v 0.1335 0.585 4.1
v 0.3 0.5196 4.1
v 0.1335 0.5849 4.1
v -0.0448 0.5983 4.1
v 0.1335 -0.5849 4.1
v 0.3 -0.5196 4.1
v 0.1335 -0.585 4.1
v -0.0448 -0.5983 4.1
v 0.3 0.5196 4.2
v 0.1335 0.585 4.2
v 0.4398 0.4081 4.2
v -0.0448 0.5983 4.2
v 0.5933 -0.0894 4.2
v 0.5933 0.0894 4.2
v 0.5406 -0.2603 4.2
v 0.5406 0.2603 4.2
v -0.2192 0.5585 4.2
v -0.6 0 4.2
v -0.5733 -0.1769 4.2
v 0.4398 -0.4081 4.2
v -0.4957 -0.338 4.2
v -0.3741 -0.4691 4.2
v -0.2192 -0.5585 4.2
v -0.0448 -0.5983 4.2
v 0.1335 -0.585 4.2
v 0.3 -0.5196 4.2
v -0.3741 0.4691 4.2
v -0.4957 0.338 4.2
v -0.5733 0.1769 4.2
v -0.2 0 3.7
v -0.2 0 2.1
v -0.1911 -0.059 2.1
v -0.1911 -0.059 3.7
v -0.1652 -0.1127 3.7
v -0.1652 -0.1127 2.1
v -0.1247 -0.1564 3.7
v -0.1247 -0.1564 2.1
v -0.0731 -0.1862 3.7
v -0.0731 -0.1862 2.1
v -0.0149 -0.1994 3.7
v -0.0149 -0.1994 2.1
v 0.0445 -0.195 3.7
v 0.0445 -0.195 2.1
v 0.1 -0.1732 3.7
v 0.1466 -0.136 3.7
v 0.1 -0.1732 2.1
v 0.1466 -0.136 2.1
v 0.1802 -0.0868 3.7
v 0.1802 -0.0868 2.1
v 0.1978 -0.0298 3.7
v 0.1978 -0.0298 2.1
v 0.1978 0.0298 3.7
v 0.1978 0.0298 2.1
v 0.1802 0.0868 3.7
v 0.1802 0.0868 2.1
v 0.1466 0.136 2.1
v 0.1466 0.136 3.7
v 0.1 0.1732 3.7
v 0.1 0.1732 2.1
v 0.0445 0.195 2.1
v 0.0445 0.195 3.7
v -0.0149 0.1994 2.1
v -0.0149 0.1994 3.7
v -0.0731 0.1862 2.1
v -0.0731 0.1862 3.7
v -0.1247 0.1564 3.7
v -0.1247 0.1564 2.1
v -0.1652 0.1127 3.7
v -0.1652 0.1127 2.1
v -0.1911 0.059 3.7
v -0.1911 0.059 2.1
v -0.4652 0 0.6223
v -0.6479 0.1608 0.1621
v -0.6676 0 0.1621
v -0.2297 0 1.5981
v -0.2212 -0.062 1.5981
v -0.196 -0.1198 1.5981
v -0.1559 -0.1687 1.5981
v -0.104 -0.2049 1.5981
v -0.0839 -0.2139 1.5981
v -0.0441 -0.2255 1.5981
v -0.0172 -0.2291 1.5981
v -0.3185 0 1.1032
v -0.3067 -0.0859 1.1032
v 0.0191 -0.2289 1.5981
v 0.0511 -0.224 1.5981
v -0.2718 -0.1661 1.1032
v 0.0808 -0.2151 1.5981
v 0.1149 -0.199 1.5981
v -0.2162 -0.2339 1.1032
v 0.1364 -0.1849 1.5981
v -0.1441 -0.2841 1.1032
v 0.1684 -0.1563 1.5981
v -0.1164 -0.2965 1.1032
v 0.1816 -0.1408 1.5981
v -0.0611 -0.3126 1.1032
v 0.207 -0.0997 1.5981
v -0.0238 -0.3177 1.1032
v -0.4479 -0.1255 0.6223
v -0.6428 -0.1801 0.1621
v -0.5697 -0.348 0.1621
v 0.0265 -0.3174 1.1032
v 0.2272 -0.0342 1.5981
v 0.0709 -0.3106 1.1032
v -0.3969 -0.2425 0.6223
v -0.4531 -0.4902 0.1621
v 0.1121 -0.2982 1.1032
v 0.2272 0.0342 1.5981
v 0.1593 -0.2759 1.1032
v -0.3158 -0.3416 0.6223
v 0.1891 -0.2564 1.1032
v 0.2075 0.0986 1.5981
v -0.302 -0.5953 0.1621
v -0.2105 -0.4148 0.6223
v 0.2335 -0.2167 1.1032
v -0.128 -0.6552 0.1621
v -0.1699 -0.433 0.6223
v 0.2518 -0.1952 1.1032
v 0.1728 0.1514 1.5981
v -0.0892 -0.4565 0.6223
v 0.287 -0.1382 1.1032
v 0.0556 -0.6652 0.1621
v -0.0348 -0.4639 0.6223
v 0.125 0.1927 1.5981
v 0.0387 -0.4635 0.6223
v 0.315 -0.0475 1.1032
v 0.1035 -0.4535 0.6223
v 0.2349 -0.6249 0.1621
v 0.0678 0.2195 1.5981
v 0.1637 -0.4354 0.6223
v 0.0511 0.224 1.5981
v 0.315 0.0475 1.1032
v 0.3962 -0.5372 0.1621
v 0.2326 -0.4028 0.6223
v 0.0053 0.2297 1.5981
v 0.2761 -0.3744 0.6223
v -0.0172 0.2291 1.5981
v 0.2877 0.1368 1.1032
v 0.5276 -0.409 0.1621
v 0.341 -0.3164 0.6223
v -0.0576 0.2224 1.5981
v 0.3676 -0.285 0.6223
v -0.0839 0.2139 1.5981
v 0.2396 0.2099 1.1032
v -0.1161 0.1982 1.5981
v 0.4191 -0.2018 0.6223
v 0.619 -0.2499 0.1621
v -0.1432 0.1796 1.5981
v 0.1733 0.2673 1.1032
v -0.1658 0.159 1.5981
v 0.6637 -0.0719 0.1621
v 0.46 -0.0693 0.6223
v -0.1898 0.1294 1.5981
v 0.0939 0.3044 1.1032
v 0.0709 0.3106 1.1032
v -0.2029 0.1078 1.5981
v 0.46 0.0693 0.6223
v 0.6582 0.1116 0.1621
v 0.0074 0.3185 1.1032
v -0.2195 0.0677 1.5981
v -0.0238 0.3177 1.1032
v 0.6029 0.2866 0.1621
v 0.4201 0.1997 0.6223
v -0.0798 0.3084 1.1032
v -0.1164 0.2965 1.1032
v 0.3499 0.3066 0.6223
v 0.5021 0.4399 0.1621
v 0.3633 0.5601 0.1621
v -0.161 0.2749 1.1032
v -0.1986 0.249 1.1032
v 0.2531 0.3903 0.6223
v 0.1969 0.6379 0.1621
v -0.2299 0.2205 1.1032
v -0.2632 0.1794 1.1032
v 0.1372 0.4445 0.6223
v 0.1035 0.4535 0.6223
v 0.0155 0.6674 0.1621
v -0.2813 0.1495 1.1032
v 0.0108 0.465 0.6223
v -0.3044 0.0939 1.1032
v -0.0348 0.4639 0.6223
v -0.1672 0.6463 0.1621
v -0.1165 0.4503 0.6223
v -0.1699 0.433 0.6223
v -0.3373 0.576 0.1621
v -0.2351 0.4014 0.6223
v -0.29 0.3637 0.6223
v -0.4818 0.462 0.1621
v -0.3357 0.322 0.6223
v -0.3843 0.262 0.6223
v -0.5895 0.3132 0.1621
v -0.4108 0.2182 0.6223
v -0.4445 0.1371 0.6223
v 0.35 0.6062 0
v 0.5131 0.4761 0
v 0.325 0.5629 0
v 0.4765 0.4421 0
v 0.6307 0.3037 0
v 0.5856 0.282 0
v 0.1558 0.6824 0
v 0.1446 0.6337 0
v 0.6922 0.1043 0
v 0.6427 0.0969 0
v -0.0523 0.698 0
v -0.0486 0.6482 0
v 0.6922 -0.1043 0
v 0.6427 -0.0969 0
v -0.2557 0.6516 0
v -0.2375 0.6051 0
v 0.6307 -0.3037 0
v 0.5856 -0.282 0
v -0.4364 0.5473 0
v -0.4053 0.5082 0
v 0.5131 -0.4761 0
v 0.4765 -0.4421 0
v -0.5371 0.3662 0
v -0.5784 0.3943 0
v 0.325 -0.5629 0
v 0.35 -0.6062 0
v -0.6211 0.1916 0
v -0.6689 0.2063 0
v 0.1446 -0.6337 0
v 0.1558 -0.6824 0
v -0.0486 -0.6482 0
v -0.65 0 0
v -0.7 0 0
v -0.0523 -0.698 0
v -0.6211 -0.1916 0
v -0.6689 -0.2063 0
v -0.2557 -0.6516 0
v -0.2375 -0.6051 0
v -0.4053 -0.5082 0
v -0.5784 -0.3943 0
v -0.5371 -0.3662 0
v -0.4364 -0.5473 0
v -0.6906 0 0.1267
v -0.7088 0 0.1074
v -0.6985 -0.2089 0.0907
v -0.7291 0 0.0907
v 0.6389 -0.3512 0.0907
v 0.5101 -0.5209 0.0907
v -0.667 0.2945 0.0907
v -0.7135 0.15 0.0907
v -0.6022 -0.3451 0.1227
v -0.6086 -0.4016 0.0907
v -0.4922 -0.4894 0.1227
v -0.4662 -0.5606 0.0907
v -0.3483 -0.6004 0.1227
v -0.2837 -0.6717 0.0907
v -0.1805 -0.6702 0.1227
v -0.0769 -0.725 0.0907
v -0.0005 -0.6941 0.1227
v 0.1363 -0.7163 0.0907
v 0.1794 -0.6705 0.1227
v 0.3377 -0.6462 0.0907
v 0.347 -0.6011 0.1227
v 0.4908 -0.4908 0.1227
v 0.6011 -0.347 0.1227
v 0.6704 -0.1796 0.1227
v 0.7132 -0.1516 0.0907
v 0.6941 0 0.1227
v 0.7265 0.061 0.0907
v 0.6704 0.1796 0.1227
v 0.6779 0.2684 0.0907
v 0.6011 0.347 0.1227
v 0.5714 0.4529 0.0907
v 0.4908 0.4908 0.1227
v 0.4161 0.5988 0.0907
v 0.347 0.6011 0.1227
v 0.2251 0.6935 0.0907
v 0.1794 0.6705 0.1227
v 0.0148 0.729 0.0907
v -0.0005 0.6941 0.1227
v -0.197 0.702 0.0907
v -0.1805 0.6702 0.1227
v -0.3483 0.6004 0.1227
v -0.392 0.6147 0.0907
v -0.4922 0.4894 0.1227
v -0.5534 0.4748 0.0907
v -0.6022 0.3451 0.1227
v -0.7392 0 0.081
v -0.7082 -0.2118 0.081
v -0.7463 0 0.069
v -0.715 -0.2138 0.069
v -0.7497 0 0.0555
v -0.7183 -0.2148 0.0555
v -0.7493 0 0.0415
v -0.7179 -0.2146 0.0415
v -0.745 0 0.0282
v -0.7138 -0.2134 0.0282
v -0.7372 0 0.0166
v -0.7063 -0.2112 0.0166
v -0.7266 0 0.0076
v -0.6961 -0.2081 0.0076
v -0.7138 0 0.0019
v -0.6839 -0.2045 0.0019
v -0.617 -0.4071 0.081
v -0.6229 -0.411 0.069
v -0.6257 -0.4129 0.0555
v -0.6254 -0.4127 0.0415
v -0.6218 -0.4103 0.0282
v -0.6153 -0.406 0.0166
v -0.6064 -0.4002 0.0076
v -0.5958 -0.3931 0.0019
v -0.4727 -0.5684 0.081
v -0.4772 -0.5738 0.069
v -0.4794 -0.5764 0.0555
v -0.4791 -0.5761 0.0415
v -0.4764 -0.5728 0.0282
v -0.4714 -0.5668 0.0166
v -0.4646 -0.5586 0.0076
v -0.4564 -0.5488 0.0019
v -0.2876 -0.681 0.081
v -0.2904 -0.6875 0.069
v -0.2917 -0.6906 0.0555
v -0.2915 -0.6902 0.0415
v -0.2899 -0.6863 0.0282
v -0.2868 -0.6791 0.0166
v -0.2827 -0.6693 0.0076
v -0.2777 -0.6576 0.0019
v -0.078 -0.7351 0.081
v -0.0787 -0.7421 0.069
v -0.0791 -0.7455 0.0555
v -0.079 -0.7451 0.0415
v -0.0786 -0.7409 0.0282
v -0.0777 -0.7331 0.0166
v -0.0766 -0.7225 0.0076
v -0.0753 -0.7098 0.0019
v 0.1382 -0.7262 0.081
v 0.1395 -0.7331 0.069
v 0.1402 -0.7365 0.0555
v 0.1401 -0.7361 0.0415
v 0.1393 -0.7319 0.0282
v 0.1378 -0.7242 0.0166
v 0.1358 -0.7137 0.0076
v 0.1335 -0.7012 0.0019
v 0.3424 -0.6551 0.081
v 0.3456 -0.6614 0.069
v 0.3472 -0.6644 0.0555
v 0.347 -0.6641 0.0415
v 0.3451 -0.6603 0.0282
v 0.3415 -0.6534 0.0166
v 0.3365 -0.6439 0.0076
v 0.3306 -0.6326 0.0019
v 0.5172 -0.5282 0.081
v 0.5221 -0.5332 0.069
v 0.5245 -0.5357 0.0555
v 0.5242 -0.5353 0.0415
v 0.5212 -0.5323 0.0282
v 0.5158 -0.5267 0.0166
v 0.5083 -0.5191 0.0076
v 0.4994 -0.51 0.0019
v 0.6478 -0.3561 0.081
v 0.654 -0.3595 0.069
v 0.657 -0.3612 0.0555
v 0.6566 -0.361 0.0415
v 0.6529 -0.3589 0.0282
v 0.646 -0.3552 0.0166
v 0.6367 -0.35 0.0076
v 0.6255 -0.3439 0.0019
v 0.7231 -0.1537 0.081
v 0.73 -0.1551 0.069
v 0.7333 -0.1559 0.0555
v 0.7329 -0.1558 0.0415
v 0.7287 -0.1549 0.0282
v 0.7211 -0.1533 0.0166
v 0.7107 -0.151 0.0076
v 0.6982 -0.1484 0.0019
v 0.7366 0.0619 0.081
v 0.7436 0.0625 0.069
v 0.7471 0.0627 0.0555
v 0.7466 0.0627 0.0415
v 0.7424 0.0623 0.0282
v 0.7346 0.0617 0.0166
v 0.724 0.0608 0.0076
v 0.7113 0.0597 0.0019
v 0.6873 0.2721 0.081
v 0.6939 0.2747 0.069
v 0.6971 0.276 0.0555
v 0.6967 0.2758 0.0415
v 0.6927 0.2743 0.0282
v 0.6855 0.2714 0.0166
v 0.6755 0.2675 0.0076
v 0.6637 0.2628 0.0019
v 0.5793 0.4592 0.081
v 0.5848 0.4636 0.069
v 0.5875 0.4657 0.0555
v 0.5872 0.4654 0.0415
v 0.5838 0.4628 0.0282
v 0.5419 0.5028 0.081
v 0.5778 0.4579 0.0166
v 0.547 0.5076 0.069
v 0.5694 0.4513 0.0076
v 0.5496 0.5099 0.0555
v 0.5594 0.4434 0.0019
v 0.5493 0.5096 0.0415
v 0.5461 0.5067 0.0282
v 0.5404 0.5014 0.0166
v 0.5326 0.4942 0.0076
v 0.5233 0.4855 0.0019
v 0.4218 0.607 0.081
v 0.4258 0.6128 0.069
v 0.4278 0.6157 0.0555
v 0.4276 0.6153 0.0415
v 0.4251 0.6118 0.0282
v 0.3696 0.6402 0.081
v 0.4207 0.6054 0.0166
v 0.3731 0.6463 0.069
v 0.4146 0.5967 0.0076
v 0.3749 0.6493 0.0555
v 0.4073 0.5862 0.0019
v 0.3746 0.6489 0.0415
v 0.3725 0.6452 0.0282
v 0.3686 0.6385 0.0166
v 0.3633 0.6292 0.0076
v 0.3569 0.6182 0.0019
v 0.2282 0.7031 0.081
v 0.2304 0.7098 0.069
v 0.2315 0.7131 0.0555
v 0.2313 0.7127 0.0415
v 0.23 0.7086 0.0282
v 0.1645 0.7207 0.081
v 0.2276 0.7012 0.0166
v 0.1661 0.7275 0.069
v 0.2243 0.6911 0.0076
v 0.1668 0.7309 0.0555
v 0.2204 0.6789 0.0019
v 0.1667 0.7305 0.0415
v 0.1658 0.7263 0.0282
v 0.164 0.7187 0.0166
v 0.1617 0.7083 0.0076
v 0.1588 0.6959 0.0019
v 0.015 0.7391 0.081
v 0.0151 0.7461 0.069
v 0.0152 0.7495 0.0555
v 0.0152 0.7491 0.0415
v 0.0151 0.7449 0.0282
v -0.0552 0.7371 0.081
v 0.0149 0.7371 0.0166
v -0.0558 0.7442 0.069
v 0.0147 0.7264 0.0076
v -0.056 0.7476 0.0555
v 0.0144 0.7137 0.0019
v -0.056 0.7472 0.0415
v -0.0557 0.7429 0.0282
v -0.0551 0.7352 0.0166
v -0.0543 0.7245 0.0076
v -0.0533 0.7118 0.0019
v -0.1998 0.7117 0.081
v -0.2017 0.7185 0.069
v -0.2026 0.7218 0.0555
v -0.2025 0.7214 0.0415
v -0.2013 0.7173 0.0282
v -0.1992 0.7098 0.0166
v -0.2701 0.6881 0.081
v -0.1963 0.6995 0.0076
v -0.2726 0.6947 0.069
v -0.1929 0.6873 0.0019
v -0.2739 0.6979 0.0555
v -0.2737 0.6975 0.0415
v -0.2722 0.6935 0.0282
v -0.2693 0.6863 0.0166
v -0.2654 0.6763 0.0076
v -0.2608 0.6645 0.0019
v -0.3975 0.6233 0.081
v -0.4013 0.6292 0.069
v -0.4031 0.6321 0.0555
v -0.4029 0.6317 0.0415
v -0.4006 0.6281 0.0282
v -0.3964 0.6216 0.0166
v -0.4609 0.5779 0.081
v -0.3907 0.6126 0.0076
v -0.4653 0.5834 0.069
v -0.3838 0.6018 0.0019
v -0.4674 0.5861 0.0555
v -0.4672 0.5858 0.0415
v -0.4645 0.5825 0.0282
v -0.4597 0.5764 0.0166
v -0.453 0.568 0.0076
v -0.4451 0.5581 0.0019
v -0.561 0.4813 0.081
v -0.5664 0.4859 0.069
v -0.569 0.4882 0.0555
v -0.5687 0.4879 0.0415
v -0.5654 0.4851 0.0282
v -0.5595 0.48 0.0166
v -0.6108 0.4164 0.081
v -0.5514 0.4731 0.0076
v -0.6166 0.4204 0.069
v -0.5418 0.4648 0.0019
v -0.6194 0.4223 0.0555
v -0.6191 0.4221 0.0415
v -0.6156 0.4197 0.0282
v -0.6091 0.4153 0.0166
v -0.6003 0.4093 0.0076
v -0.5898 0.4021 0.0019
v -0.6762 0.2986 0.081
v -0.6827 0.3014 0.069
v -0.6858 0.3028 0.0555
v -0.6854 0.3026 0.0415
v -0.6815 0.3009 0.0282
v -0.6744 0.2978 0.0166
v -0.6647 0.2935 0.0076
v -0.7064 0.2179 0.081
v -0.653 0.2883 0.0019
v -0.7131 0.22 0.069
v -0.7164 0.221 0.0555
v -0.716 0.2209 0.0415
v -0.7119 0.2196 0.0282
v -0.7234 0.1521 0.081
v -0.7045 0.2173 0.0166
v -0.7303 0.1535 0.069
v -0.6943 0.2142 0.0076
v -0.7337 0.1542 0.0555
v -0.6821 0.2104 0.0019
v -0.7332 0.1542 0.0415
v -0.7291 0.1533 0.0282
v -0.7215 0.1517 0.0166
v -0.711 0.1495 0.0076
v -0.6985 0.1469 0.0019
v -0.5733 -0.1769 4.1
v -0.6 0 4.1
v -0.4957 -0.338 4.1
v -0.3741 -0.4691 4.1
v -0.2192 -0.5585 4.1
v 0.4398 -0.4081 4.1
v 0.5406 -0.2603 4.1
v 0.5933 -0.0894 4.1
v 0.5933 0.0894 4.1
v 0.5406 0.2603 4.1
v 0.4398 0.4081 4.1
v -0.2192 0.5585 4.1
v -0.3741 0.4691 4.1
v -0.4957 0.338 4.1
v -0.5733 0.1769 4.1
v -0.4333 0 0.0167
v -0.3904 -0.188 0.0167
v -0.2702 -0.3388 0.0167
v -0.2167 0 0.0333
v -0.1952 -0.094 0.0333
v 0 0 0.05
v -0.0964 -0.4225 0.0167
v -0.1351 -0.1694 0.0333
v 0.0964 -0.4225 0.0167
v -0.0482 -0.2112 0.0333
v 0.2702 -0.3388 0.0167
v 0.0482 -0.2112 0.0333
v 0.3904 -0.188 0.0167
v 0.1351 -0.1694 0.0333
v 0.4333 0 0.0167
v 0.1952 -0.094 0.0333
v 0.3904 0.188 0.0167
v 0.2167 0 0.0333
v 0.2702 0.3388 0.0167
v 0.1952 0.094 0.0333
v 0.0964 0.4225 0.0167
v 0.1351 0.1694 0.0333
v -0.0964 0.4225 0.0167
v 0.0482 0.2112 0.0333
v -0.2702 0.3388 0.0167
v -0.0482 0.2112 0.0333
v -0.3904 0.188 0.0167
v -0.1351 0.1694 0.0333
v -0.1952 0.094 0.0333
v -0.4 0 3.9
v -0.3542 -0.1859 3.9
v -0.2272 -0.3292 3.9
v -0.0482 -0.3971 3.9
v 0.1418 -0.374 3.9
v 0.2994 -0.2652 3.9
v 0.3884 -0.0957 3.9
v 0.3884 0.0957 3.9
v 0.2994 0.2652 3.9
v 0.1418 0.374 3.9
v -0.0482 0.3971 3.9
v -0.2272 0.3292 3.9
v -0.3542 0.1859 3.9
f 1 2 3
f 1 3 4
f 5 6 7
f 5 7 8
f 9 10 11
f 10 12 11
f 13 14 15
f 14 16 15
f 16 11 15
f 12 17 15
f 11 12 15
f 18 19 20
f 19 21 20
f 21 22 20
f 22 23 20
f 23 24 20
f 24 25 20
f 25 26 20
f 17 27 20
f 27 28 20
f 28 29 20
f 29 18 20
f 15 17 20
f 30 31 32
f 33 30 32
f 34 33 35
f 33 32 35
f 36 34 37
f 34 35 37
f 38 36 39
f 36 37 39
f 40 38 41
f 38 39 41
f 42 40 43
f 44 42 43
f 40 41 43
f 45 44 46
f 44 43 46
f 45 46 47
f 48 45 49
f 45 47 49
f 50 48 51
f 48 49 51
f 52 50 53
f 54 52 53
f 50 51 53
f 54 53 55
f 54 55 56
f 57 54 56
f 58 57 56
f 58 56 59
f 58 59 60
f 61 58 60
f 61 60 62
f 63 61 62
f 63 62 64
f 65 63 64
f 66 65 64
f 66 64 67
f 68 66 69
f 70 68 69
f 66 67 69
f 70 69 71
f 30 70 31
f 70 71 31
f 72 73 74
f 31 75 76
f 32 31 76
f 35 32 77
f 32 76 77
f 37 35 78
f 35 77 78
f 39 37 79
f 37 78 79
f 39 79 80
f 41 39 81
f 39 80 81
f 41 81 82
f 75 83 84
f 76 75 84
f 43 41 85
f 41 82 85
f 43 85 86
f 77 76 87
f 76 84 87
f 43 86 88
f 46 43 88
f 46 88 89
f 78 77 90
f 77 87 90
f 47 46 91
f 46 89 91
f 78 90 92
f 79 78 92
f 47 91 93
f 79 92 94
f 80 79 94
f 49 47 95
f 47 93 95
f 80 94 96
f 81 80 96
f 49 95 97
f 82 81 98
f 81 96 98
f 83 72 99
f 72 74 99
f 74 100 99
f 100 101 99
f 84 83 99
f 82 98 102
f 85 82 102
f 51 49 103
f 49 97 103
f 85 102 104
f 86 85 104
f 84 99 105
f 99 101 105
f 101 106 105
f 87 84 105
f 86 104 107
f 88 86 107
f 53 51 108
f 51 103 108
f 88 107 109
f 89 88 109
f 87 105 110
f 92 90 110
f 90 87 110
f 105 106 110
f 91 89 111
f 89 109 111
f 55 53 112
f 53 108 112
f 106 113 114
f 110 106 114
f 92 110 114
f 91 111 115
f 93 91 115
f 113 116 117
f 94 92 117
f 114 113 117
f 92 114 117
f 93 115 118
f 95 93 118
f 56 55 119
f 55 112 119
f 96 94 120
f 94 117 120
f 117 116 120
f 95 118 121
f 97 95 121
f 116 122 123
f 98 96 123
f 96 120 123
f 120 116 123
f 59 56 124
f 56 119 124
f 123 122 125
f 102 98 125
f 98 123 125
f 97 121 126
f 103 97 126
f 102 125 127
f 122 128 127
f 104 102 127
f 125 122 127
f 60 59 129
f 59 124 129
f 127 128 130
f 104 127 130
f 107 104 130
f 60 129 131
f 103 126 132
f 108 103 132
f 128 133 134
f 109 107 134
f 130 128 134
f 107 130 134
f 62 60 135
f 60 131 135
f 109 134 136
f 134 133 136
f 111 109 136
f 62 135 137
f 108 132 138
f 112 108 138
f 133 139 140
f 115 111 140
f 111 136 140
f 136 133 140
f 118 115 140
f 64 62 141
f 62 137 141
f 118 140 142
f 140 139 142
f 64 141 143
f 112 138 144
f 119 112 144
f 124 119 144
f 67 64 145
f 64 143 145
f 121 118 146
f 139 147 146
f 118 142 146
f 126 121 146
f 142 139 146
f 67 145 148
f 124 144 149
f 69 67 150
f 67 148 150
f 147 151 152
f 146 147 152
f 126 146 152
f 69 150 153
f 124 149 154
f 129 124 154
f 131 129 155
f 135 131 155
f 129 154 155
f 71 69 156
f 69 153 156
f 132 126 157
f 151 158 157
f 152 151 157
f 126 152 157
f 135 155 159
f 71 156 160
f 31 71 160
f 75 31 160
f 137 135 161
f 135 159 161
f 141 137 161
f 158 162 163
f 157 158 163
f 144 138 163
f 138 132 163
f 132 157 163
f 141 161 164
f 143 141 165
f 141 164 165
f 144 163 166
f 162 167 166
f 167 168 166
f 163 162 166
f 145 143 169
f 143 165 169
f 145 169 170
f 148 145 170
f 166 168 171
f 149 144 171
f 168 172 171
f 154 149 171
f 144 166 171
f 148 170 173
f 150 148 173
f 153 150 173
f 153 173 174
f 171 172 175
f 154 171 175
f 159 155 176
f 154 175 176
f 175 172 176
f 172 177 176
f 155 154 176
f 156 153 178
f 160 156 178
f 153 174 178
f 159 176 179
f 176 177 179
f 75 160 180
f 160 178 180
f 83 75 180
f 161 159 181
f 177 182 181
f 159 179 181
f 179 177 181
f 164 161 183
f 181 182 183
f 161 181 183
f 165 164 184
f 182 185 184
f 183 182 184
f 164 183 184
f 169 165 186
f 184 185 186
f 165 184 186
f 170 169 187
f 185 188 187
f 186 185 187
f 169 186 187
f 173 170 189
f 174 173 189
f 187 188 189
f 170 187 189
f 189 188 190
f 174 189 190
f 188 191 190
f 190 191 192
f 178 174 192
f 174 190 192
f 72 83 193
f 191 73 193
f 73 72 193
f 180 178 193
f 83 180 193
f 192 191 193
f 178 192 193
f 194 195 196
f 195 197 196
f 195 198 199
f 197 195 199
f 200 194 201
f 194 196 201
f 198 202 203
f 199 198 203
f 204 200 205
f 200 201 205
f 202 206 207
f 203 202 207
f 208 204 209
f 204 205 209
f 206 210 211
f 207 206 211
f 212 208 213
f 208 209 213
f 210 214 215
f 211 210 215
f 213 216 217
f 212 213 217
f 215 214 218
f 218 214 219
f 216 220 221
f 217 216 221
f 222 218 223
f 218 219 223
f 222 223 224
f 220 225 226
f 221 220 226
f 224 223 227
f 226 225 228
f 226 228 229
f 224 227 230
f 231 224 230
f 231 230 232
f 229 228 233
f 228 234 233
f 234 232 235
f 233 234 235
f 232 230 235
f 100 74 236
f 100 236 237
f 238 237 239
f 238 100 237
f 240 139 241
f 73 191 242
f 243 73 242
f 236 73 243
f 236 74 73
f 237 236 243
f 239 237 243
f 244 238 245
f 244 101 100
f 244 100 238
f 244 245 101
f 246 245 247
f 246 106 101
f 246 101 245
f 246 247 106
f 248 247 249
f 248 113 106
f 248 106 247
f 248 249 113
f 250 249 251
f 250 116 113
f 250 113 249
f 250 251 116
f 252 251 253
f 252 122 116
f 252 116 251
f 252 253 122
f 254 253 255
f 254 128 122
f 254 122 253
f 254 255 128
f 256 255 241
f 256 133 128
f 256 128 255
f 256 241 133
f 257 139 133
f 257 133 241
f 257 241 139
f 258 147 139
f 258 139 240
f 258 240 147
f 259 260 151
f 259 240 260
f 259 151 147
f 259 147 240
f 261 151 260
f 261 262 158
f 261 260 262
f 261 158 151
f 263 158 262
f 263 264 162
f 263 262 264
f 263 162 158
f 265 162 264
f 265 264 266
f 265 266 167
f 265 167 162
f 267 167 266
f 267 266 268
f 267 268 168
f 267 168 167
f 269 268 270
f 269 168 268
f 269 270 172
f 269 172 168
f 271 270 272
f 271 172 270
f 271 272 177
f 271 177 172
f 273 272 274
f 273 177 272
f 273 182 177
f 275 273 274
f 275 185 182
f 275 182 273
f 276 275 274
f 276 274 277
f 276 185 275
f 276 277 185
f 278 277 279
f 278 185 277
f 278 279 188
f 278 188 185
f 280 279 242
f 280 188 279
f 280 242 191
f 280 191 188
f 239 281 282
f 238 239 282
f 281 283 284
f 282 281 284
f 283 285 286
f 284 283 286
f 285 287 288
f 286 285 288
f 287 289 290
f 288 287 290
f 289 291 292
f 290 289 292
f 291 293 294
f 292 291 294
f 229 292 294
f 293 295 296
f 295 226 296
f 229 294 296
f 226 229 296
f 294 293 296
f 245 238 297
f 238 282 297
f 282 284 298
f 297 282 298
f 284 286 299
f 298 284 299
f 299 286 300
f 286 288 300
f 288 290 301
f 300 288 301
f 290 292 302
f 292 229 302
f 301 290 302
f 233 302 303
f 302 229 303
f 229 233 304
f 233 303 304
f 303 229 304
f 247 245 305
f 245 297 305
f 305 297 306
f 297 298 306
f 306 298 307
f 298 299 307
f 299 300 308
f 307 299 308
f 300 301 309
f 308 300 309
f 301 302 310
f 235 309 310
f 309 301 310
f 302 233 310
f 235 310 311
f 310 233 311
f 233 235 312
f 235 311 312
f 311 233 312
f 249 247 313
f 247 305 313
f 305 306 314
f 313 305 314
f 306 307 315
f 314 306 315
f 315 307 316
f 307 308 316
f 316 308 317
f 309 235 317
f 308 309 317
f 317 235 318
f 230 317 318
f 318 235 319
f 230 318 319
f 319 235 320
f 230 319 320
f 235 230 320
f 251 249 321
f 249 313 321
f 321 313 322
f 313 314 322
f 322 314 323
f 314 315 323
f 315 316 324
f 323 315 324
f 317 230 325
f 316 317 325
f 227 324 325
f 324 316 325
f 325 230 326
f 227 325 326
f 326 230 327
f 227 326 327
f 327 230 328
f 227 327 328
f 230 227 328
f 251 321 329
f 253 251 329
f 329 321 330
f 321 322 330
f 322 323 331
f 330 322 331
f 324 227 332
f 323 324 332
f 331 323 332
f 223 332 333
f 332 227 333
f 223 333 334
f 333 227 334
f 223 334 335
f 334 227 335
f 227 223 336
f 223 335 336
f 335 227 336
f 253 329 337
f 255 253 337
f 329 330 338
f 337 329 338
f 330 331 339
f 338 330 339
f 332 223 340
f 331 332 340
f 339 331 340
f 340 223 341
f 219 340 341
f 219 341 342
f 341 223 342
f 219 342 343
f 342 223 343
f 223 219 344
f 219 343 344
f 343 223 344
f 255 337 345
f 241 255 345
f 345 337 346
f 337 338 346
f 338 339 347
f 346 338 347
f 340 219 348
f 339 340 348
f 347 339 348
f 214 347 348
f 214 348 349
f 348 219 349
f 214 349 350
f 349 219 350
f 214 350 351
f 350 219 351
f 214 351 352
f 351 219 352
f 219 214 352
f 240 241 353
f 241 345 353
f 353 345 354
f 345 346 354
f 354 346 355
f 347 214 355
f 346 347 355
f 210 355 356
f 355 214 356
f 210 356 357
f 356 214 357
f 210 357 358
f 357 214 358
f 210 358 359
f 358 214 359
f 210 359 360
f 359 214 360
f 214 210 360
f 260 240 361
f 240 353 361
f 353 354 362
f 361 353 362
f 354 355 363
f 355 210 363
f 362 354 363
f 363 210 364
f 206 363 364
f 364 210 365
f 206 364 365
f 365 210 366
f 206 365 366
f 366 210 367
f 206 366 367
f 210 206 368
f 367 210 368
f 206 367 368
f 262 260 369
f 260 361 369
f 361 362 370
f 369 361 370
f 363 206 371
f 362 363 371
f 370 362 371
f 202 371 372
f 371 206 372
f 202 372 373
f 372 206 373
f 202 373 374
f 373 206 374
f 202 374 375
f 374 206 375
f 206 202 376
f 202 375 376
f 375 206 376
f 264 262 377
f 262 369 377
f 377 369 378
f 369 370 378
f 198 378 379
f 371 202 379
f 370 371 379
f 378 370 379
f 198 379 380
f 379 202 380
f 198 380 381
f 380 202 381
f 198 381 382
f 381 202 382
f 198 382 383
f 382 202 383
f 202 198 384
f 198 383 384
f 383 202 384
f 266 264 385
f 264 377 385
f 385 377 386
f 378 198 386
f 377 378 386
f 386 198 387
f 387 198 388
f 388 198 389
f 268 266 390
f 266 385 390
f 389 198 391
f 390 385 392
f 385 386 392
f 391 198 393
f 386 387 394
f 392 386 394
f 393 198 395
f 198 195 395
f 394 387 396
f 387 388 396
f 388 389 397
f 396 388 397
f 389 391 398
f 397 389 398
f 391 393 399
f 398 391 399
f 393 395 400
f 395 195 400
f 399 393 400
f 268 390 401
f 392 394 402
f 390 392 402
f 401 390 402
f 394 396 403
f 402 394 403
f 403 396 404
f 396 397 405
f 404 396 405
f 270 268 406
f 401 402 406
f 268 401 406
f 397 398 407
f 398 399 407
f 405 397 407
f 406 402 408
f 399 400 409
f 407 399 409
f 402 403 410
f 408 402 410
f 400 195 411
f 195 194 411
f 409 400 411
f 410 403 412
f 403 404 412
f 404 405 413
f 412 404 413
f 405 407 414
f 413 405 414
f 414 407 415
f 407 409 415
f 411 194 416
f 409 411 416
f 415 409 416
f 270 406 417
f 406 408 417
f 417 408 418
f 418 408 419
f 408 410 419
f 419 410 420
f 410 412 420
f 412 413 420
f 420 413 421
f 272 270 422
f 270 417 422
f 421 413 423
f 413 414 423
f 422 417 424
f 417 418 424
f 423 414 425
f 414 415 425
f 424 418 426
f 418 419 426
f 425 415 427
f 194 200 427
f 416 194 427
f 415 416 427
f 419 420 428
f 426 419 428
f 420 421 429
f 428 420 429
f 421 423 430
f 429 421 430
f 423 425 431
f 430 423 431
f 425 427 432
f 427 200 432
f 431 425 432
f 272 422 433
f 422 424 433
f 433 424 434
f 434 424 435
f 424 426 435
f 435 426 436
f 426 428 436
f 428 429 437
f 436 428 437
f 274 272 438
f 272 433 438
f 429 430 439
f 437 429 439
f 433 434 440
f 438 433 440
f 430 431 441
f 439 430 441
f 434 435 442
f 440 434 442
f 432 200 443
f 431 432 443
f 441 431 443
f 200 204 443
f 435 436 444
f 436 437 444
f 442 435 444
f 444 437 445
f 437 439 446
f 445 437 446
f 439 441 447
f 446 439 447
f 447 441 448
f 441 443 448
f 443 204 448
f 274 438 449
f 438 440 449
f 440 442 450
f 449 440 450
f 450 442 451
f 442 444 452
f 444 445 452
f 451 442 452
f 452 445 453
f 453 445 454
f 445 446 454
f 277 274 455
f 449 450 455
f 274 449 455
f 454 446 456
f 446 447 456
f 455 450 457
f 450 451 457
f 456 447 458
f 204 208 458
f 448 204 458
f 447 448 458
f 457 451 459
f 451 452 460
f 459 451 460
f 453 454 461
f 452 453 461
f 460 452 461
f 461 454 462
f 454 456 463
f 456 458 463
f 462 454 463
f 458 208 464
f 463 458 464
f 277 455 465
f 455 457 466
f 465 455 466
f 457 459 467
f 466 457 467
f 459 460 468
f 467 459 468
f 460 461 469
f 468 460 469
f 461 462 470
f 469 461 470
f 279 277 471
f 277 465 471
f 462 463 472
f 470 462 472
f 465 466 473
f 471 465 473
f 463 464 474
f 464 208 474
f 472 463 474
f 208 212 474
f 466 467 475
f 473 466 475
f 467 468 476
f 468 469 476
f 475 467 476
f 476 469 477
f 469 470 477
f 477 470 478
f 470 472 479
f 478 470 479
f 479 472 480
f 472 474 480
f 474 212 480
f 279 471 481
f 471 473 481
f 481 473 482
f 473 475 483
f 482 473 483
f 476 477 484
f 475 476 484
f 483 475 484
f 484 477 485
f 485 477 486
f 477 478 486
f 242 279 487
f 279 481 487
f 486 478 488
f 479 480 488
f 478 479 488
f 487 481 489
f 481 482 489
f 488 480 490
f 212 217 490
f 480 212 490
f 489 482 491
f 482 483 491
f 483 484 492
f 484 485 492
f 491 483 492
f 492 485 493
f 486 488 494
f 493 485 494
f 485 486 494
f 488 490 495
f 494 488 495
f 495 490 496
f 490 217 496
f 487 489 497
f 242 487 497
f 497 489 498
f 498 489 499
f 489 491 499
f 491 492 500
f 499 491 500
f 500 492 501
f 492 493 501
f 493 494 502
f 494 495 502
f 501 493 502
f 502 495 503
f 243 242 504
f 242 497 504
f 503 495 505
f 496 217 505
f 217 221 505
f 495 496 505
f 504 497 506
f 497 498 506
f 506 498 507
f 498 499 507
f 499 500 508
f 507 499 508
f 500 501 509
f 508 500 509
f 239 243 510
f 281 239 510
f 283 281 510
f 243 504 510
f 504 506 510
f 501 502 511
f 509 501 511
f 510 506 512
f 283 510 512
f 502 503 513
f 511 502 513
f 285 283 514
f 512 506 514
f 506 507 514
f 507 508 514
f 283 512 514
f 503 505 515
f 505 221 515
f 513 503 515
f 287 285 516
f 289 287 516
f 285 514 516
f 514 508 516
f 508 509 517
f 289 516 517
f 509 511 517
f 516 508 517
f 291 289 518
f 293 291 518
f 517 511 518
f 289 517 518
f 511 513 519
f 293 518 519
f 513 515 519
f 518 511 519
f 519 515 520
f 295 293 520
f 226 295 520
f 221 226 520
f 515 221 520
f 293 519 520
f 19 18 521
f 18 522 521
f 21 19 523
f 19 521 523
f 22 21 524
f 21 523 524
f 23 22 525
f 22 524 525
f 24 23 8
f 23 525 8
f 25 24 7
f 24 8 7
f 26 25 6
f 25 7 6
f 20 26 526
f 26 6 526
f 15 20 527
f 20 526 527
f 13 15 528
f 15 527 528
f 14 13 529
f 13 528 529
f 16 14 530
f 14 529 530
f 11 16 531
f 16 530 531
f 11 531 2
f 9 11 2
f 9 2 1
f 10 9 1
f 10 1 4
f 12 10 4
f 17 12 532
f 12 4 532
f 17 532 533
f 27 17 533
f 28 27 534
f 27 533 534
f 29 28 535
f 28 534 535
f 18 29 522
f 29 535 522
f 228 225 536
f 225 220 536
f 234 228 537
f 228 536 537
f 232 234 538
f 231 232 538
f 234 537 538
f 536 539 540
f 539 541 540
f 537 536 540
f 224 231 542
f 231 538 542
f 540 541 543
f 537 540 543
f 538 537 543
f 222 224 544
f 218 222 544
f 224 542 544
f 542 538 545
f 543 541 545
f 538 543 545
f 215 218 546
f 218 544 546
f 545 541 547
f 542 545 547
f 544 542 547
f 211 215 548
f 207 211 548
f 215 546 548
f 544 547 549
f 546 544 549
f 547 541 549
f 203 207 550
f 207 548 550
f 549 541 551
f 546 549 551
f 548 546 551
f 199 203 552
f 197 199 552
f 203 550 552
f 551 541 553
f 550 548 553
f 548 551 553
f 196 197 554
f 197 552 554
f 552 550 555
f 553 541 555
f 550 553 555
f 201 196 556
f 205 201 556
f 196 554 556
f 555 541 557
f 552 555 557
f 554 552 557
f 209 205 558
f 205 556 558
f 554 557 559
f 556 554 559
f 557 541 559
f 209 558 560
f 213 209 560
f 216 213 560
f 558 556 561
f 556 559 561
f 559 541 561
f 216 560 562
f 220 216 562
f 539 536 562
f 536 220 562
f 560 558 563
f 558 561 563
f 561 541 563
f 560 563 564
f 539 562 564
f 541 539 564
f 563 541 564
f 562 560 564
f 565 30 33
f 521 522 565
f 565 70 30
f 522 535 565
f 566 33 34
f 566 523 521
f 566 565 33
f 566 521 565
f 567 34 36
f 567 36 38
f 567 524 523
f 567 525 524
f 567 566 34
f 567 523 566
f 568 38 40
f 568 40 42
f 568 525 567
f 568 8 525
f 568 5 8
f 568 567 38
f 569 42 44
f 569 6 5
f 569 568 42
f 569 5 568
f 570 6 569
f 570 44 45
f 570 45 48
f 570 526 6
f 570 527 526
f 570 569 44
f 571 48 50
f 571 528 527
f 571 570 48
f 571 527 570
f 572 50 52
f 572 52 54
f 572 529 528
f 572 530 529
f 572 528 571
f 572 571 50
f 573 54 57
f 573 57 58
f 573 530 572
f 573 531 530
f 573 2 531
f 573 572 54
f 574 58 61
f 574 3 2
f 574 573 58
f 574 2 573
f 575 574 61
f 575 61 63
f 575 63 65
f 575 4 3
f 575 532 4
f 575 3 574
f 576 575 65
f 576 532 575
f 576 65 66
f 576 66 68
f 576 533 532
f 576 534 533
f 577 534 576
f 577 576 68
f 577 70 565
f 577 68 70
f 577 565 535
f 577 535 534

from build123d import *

# Parameters (mm, degrees)
F2_R    = 0.2
F3_SIZE = 0.39999


# Not quite as in the source:
# - a fillet or chamfer is up to 0.001 mm smaller than in the source, because OpenCascade refuses the exact size


with BuildPart() as f1:
    # F0 (on Front) → F1 (revolve)
    with BuildSketch(Plane.XZ):
        Polygon((-0.7, 0), (-0.65, 0), (0, 0.05), (0, 0.1), (-0.2, 0.1), (-0.7, 0.1), align=None)
        with BuildLine():
            ThreePointArc((-0.7, 0.1), (-0.75, 0.05), (-0.7, 0))
            Line((-0.7, 0), (-0.7, 0.1))
        make_face()
        with BuildLine():
            ThreePointArc((-0.2, 2.1), (-0.3268943744, 1.0692235936), (-0.7, 0.1))
            Line((-0.7, 0.1), (-0.2, 0.1))
            Line((-0.2, 0.1), (-0.2, 2.1))
        make_face()
        Polygon((-0.2, 0.1), (0, 0.1), (0, 4.1), (-0.2, 4.1), (-0.2, 2.1), align=None)
        Polygon((-0.2, 4.1), (0, 4.1), (0, 4.2), (-0.6, 4.2), (-0.6, 4.1), align=None)
    revolve(axis=Axis((0, 0, 2.1), (0, 0, 1)))

    # F2
    f2_edges = [f1.edges().sort_by_distance(p)[0] for p in [
        (0.7, 0, 0.1),
    ]]
    fillet(f2_edges, radius=F2_R)

    # F3 (size 0.4 in the source; OpenCascade refuses exactly that, so slightly less here)
    f3_edges = [f1.edges().sort_by_distance(p)[0] for p in [
        (0.2, 0, 4.1),
    ]]
    chamfer(f3_edges, length=F3_SIZE)


solid = f1.part
